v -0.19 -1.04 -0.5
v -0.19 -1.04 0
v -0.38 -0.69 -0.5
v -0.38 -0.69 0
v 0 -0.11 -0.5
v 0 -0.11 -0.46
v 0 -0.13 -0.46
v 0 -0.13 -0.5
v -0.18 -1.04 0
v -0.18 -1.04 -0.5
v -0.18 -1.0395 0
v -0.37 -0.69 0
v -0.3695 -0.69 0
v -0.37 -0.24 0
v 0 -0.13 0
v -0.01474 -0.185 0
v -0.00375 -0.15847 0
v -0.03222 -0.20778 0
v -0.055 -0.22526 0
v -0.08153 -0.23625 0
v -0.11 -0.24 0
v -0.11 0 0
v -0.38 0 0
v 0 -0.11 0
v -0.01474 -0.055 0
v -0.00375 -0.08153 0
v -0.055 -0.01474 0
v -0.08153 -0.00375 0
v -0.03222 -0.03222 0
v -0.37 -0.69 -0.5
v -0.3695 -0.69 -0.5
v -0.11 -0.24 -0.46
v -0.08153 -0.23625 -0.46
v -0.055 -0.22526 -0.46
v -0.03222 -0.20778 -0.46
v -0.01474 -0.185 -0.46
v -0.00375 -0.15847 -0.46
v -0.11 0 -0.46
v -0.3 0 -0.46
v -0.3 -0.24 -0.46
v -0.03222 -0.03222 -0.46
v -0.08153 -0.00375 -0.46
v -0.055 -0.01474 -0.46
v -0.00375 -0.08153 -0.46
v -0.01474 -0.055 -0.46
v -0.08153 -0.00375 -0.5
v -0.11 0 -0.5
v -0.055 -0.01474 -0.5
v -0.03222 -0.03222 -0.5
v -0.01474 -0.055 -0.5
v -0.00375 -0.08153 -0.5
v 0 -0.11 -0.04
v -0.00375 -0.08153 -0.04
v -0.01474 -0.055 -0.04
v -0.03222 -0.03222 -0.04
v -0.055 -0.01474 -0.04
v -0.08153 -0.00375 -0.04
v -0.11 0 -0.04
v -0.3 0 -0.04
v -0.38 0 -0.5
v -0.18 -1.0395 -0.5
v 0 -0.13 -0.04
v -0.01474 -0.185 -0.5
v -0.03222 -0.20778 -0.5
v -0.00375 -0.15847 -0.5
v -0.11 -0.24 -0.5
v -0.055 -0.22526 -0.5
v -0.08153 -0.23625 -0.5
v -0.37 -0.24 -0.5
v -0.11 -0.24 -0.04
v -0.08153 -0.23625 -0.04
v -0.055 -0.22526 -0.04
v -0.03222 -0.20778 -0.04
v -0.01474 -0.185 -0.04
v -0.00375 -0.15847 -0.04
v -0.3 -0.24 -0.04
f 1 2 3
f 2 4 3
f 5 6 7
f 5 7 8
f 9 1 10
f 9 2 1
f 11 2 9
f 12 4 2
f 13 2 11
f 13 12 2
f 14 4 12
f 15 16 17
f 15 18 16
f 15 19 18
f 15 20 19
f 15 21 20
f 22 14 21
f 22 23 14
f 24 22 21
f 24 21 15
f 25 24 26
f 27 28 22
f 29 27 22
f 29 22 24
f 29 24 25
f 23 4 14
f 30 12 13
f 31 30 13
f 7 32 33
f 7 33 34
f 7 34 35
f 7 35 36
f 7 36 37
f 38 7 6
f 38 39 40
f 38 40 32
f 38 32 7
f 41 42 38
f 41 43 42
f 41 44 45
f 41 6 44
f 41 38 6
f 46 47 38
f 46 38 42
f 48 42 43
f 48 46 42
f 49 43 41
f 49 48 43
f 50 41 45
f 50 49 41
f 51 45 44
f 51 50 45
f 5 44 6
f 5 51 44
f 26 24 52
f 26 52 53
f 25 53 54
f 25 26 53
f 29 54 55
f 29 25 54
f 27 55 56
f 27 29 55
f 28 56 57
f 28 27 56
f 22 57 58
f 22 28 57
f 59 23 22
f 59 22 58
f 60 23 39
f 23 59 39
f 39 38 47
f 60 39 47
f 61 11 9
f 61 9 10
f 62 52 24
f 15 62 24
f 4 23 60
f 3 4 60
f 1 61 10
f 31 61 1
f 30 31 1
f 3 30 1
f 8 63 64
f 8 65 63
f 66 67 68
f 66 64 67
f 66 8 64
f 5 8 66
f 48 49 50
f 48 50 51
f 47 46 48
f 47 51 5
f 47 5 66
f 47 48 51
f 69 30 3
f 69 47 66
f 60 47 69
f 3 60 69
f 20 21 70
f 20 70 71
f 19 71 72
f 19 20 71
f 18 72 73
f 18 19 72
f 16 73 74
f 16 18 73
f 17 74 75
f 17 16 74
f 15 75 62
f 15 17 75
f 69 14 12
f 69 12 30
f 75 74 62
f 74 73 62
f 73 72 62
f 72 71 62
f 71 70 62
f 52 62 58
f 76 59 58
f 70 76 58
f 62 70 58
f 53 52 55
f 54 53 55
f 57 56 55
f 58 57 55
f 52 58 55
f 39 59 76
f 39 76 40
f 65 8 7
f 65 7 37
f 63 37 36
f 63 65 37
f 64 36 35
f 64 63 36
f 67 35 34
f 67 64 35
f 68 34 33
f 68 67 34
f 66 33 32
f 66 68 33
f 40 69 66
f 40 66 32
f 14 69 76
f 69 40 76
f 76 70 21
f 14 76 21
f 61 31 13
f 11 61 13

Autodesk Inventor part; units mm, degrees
ref_plane "YZ Plane" through (0, 0, 0) normal (1, 0, 0) x (0, 1, 0)
ref_plane "XZ Plane" through (0, 0, 0) normal (0, 1, 0) x (-1, 0, 0)
ref_plane "XY Plane" through (0, 0, 0) normal (0, 0, 1) x (1, 0, 0)
sketch "スケッチ1" plane through (0, 0, 0) normal (0, 1, 0) x (-1, 0, 0)
  line L0 (0, 0) -> (0.37, 0)
  line L1 (0.37, 0) -> (0.37, -0.04)
  line L2 (0.37, -0.04) -> (0, -0.04)
  line L3 (0, -0.04) -> (0, 0)
  line L4 (0.37, -0.04) -> (0.3, -0.04)
  line L5 (0.3, -0.04) -> (0.3, -0.46)
  line L6 (0.3, -0.46) -> (0.37, -0.46)
  line L7 (0.37, -0.46) -> (0.37, -0.04)
  line L8 (0.37, -0.46) -> (0, -0.46)
  line L9 (0, -0.46) -> (0, -0.5)
  line L10 (0, -0.5) -> (0.37, -0.5)
  line L11 (0.37, -0.5) -> (0.37, -0.46)
  dimension "d2" = 0.37
  dimension "d3" = 0.04
  dimension "d4" = 0.07
  dimension "d5" = 0.42
  dimension "d6" = 0.04
extrude "押し出し1" add sketch "スケッチ1" against normal blind 0.24
sketch "スケッチ2" plane through (0, -0.24, 0) normal (0, -1, 0) x (1, 0, 0)
  point P0 (0, 0)
sketch "スケッチ3" plane through (0, -0.24, 0) normal (0, -1, 0) x (1, 0, 0)
  point P0 (0, 0)
sketch "スケッチ4" plane through (0, -0.24, 0) normal (0, -1, 0) x (1, 0, 0)
  point P0 (0, 0)
fillet "フィレット1" radius 0.11 4 edges at (0, -0.24, -0.48) (0, 0, -0.48) (0, -0.24, -0.02) (0, 0, -0.02)
sketch "スケッチ5" plane through (-0.37, 0, -0.5) normal (-1, 0, 0) x (0, 0, 1)
  line L0 (0.5, 0) -> (0.5, -0.24) projected
  line L1 (0, 0) -> (0, -0.24) projected
  line L2 (0.5, 0) -> (0, 0)
  line L3 (0, 0) -> (0, -0.24)
  line L4 (0, -0.24) -> (0.5, -0.24)
  line L5 (0.5, -0.24) -> (0.5, 0)
extrude "押し出し2" add sketch "スケッチ5" along normal blind 0.01
sketch "スケッチ6" plane through (0, -0.24, 0) normal (0, -1, 0) x (1, 0, 0)
  line L0 (-0.38, -0.5) -> (-0.38, 0) projected
  line L1 (-0.11, -0.5) -> (-0.38, -0.5) projected
  line L2 (-0.38, 0) -> (-0.37, 0)
  line L3 (-0.37, 0) -> (-0.37, -0.5)
  line L4 (-0.37, -0.5) -> (-0.38, -0.5)
  line L5 (-0.38, -0.5) -> (-0.38, 0)
  point P0 (0, 0)
  dimension "d12" = 0.01
extrude "押し出し3" add sketch "スケッチ6" along normal blind 0.45
sketch "スケッチ7" plane through (0, -0.69, 0) normal (0, -1, 0) x (1, 0, 0)
  line L0 (-0.38, 0) -> (-0.38, -0.5) projected
  line L1 (-0.11, -0.5) -> (-0.38, -0.5) projected
  line L2 (-0.38, 0) -> (-0.18, 0)
  line L3 (-0.18, 0) -> (-0.18, -0.5)
  line L4 (-0.18, -0.5) -> (-0.38, -0.5)
  line L5 (-0.38, -0.5) -> (-0.38, 0)
  point P0 (0, 0)
  dimension "d15" = 0.2
extrude "押し出し4" add sketch "スケッチ7" along normal blind 0.35
sketch "スケッチ8" plane through (-0.38, 0, 0) normal (0, 0, 1) x (1, 0, 0)
  point P0 (0.38, 0)
sketch "スケッチ9" plane through (-0.38, 0, 0) normal (0, 0, 1) x (1, 0, 0)
  point P0 (0.38, 0)
sketch "スケッチ10" plane through (-0.38, 0, 0) normal (0, 0, 1) x (1, 0, 0)
  point P0 (0.38, 0)
chamfer "面取り1" distance 0.19 distance2 0.35 1 edges at (-0.38, -1.04, -0.25) measured on face at (-0.2467, -1.04, -0.3333)
chamfer "面取り2" distance 0.35 distance2 0.19 1 edges at (-0.18, -0.69, -0.25) measured on face at (-0.18, -0.8067, -0.3333)
properties part number "CRANEHAND"
